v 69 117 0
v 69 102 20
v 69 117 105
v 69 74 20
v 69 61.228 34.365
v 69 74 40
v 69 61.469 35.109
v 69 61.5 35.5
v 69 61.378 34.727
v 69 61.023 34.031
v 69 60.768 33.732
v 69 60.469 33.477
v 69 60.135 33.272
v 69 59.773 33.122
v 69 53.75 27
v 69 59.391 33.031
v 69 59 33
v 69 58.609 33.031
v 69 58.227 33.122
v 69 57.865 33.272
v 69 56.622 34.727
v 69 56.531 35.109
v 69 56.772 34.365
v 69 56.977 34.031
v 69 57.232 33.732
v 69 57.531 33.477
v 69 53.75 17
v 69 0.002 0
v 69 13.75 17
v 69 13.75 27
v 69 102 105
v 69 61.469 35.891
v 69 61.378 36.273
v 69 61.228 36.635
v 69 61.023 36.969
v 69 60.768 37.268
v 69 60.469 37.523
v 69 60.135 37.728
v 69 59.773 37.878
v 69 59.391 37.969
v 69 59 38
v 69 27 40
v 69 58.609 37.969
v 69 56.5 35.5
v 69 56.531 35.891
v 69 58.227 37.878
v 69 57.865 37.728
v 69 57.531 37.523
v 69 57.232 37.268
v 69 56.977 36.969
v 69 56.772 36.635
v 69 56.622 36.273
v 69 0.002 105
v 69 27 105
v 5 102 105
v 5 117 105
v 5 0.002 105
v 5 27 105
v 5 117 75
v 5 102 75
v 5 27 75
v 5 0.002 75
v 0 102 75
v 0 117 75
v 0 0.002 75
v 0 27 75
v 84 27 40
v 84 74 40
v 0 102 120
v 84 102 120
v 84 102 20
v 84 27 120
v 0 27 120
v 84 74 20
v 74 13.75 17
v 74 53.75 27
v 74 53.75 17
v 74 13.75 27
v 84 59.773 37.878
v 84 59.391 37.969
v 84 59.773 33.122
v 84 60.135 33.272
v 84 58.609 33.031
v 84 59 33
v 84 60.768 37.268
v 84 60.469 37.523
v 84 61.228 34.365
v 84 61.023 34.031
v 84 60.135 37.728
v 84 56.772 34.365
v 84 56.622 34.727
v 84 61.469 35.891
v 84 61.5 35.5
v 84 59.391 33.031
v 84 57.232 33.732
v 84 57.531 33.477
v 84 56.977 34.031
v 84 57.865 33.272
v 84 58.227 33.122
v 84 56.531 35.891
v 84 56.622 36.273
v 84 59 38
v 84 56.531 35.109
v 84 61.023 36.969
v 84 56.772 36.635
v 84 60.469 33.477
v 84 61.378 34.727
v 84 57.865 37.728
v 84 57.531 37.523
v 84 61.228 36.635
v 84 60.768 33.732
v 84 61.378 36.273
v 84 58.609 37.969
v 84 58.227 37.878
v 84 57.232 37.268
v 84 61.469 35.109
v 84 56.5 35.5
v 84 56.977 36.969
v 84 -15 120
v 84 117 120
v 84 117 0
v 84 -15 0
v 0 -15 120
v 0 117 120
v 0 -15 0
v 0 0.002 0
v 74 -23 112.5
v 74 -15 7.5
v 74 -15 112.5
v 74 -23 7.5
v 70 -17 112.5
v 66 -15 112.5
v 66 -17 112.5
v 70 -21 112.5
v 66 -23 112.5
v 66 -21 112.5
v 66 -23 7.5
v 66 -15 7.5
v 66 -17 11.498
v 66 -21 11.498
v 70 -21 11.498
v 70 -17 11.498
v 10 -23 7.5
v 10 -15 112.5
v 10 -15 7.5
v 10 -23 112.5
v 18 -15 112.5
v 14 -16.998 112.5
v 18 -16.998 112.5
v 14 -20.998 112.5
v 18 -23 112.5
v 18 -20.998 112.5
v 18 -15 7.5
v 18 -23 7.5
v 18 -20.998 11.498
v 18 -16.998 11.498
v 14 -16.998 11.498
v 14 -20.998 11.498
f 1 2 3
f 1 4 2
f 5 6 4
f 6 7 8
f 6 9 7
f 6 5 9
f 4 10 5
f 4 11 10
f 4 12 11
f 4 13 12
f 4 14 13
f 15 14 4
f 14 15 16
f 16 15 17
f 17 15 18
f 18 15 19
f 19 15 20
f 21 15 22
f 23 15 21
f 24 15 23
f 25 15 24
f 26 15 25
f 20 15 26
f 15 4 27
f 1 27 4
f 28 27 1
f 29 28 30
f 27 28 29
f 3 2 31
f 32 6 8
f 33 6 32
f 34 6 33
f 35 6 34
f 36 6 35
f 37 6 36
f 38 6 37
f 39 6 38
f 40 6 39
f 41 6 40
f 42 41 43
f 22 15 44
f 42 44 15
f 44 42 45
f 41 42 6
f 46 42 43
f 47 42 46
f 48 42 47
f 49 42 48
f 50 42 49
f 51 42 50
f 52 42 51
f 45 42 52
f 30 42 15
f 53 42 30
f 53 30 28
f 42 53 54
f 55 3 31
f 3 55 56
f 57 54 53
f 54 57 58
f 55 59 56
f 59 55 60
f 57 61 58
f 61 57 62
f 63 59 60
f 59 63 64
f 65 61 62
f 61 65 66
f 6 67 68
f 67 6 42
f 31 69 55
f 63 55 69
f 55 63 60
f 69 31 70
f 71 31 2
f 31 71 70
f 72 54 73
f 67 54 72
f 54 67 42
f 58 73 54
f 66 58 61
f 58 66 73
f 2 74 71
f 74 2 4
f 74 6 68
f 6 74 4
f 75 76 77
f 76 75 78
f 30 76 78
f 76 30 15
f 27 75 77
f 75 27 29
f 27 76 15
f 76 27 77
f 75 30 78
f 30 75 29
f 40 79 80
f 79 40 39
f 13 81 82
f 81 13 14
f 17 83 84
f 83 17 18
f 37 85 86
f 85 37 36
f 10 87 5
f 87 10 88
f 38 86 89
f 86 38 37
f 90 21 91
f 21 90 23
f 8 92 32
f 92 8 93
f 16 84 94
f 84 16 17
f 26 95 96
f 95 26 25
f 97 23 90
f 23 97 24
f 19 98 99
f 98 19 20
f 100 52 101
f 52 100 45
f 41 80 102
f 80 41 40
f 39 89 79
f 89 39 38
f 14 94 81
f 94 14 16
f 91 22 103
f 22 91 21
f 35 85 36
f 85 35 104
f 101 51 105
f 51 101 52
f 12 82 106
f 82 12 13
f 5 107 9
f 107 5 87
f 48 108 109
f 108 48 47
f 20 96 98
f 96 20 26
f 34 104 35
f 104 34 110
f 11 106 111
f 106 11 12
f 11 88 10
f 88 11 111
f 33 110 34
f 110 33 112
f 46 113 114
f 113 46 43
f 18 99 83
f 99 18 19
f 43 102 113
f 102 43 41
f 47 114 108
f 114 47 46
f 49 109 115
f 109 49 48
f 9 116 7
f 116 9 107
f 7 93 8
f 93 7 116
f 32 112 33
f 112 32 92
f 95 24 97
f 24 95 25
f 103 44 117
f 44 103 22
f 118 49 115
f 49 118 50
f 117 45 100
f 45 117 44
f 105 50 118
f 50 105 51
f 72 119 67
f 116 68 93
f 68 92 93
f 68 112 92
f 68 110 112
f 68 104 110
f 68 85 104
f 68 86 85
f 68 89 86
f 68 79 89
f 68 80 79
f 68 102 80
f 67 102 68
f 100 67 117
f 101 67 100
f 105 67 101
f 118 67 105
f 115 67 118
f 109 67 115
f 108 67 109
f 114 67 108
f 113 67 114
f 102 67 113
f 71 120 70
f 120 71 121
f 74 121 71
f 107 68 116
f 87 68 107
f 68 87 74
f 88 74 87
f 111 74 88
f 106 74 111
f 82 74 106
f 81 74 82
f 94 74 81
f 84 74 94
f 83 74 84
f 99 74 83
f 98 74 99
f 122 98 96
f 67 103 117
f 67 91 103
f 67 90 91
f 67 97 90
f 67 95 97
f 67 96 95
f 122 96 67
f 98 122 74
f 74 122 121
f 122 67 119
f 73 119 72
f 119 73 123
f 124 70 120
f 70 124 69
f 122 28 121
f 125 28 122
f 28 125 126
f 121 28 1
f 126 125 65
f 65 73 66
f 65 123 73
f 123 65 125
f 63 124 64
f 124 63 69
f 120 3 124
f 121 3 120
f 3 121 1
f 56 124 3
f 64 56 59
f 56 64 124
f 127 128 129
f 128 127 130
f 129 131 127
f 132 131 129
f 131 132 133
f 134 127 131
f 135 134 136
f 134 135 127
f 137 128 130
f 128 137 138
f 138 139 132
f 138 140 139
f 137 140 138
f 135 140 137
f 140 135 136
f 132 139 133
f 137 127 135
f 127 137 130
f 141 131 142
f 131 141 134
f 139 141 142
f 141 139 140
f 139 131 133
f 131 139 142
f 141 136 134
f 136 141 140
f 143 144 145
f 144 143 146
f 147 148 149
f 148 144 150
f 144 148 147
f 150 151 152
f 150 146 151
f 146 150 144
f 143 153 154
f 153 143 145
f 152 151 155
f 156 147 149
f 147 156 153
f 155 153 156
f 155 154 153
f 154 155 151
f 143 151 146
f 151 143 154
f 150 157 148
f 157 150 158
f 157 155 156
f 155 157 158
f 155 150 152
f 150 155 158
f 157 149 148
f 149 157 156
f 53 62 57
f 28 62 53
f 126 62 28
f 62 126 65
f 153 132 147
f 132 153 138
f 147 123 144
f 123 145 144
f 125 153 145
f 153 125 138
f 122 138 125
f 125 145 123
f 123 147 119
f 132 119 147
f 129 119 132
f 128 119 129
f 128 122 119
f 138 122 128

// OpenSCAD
$fa = 1;
$fs = 0.4;
tw = 15; // top width
bw = 5; // back width 
fw = 15; // front width
h = 105; // height excl tw
d = 64; // depth excl fw/bw
w = 117; // width
bh = 30; // back height excl tw
lw = 27; // left hook width
rw = 15; // right hook width
fhh = 65; // front hole height excl tw
rhw = 28; // front right hole width
rhh = 20; // front right hole height
nw = 40; // nub cutout width
nh = 10; // nub cutout height
nd = 5; // nub cutout depth
ppd = 15; // pcb holder plane depth
ph = 8; // pcb holder width and height
phd = 10; // pcb holder distance from edge
tol = 0.002;

module pcbholder() {
    difference() {
        cube([ph, ph+tol, h]);
        translate([-tol, 2, -tol+ph/2])
            cube([ph-ph/2+tol, ph-ph/2, h+tol]);
    }
}

union() {
    // main
    difference() {
        // "main" box
        cube([bw+d+fw, w, h+tw]);
        
        // cutouts
        union() {
            // sideways middle
            translate([bw, -tol, -tol])
                cube([d, w+tol*2, h+tol]);
            
            // sideways back
            translate([-tol, -tol, -tol])
                cube([bw+2*tol, w+tol*2, h-bh+tol]);
            
            // front top
            translate([-tol, lw, h+tw-(fhh+tw)])
                cube([bw+d+fw+2*tol, w-lw-rw, fhh+tw+tol]);
            
            // front right
            translate([-tol, w-rw-rhw,h+tw-(fhh+tw+rhh)])
                cube([bw+d+fw+2*tol, rhw, rhh+tol]);
            
            // nub cutout, position based on measurements
            translate([d+bw-tol, 110-100.75-2.5+7, h-83-nh/2])
                cube([nd+tol, nw, nh]);

            // sensor hole
            translate([d+bw-tol, w-rw-rhw-15, h-69.5])
                rotate([0, 90, 0])
                cylinder(fw+2*tol, 2.5, 2.5);            

        }
    }
    
    // pcb holder plane
    translate([0, -ppd, 0])
        cube([d+fw+bw, ppd+tol, h+tw]);
    
    // right pcb holder
    translate([d+fw+bw-ph-phd, -ppd-ph, tw/2])
        pcbholder();
    
    // left pcb holder
    translate([phd, -ppd-ph, tw/2]) // position
        translate([ph, ph+tol, 0]) // compensate for rotation
        rotate([180, 180, 0]) // rotate
        pcbholder();

}
